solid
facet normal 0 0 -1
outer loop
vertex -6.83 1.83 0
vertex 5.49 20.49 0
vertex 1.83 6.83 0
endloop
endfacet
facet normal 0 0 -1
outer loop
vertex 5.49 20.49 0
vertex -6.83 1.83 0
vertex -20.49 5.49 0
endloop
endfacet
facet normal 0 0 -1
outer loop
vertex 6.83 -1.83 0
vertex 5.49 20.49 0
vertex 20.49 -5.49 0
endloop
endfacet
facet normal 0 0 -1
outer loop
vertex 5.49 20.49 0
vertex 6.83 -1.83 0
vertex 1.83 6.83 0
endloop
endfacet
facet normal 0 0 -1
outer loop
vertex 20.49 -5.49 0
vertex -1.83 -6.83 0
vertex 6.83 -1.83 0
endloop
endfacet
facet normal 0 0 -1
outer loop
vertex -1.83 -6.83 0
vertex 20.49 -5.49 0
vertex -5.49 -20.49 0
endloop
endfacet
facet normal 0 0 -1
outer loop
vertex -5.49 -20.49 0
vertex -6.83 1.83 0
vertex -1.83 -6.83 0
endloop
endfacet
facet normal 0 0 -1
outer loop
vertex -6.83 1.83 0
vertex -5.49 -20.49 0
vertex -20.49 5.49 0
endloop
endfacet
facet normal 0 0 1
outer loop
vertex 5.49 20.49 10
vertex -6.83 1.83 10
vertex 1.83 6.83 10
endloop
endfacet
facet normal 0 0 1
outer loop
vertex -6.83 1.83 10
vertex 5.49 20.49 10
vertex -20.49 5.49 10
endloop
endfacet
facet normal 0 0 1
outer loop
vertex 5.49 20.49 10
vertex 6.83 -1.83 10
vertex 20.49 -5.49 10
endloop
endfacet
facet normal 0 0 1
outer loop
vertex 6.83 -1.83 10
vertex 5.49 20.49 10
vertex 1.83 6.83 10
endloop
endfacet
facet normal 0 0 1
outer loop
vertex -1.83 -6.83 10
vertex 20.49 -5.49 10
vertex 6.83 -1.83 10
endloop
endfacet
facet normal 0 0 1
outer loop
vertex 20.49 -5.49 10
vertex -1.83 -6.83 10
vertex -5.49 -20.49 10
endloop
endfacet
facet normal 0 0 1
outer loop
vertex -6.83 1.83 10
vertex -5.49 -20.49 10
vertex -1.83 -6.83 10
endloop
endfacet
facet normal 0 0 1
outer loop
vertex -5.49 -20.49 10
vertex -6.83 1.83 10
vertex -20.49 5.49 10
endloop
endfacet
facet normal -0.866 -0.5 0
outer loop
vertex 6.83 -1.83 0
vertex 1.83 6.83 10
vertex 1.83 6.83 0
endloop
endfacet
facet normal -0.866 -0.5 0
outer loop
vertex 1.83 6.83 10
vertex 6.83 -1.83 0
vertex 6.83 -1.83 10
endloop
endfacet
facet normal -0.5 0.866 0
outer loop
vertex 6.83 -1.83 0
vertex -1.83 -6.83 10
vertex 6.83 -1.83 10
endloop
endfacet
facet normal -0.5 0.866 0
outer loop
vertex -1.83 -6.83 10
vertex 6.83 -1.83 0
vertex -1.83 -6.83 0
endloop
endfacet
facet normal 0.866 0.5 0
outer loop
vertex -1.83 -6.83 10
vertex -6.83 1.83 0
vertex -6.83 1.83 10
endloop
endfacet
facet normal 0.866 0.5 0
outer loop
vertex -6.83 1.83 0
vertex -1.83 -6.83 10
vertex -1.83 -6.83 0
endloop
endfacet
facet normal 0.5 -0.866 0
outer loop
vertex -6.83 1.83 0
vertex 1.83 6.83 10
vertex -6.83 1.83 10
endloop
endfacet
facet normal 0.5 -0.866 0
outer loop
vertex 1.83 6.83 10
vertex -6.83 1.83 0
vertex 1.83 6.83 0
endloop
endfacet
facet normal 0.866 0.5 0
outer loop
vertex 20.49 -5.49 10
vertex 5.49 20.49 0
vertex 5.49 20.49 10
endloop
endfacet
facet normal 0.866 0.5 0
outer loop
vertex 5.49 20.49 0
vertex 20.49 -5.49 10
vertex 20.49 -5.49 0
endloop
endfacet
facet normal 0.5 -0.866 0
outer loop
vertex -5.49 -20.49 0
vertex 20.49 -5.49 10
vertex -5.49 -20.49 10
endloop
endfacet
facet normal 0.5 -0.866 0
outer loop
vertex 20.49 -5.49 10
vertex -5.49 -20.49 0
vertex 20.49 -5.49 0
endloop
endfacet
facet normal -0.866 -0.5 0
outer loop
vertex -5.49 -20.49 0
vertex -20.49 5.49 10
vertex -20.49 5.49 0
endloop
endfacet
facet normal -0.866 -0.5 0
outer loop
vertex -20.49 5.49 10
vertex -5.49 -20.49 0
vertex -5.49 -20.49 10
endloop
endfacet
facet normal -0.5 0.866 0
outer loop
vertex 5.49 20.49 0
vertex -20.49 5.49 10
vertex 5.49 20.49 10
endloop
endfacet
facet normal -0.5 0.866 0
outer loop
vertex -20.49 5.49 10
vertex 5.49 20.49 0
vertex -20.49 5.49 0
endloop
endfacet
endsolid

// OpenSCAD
union() {
    rotate([0,0,30])
    translate([-15,-15,0]) {
        scale(10) {
            polyhedron(
                //         1------------------0
                //        /|                 /|
                //       / |    9----8      / |
                //      /  5-- /|   /| ----/--4
                //     /  /  11----10|    /  /
                //    /  /    |13--|-12  /  /
                //   3------  |/   |/ --2  /
                //   | /     15----14   | /
                //   |/                 |/
                //   7------------------6
                points=[
                    [3,3,1],
                    [0,3,1],
                    [3,0,1],
                    [0,0,1],
                    [3,3,0],
                    [0,3,0],
                    [3,0,0],
                    [0,0,0],

                    [2,2,1],
                    [1,2,1],
                    [2,1,1],
                    [1,1,1],
                    [2,2,0],
                    [1,2,0],
                    [2,1,0],
                    [1,1,0],
                ],
                faces=[
                    [  4,  5, 13, 12 ],
                    [  4, 12, 14,  6 ],
                    [  6, 14, 15,  7 ],
                    [  7, 15, 13,  5 ],

                    [  1,  0,  8,  9 ],
                    [  0,  2, 10,  8 ],
                    [  2,  3, 11, 10 ],
                    [  3,  1,  9, 11 ],

                    [  8, 10, 14, 12 ],
                    [ 10, 11, 15, 14 ],
                    [ 11,  9, 13, 15 ],
                    [  9,  8, 12, 13 ],

                    [  0,  4,  6,  2 ],
                    [  2,  6,  7,  3 ],
                    [  3,  7,  5,  1 ],
                    [  1,  5,  4,  0 ],
                ]
            );
        };
    }
}
